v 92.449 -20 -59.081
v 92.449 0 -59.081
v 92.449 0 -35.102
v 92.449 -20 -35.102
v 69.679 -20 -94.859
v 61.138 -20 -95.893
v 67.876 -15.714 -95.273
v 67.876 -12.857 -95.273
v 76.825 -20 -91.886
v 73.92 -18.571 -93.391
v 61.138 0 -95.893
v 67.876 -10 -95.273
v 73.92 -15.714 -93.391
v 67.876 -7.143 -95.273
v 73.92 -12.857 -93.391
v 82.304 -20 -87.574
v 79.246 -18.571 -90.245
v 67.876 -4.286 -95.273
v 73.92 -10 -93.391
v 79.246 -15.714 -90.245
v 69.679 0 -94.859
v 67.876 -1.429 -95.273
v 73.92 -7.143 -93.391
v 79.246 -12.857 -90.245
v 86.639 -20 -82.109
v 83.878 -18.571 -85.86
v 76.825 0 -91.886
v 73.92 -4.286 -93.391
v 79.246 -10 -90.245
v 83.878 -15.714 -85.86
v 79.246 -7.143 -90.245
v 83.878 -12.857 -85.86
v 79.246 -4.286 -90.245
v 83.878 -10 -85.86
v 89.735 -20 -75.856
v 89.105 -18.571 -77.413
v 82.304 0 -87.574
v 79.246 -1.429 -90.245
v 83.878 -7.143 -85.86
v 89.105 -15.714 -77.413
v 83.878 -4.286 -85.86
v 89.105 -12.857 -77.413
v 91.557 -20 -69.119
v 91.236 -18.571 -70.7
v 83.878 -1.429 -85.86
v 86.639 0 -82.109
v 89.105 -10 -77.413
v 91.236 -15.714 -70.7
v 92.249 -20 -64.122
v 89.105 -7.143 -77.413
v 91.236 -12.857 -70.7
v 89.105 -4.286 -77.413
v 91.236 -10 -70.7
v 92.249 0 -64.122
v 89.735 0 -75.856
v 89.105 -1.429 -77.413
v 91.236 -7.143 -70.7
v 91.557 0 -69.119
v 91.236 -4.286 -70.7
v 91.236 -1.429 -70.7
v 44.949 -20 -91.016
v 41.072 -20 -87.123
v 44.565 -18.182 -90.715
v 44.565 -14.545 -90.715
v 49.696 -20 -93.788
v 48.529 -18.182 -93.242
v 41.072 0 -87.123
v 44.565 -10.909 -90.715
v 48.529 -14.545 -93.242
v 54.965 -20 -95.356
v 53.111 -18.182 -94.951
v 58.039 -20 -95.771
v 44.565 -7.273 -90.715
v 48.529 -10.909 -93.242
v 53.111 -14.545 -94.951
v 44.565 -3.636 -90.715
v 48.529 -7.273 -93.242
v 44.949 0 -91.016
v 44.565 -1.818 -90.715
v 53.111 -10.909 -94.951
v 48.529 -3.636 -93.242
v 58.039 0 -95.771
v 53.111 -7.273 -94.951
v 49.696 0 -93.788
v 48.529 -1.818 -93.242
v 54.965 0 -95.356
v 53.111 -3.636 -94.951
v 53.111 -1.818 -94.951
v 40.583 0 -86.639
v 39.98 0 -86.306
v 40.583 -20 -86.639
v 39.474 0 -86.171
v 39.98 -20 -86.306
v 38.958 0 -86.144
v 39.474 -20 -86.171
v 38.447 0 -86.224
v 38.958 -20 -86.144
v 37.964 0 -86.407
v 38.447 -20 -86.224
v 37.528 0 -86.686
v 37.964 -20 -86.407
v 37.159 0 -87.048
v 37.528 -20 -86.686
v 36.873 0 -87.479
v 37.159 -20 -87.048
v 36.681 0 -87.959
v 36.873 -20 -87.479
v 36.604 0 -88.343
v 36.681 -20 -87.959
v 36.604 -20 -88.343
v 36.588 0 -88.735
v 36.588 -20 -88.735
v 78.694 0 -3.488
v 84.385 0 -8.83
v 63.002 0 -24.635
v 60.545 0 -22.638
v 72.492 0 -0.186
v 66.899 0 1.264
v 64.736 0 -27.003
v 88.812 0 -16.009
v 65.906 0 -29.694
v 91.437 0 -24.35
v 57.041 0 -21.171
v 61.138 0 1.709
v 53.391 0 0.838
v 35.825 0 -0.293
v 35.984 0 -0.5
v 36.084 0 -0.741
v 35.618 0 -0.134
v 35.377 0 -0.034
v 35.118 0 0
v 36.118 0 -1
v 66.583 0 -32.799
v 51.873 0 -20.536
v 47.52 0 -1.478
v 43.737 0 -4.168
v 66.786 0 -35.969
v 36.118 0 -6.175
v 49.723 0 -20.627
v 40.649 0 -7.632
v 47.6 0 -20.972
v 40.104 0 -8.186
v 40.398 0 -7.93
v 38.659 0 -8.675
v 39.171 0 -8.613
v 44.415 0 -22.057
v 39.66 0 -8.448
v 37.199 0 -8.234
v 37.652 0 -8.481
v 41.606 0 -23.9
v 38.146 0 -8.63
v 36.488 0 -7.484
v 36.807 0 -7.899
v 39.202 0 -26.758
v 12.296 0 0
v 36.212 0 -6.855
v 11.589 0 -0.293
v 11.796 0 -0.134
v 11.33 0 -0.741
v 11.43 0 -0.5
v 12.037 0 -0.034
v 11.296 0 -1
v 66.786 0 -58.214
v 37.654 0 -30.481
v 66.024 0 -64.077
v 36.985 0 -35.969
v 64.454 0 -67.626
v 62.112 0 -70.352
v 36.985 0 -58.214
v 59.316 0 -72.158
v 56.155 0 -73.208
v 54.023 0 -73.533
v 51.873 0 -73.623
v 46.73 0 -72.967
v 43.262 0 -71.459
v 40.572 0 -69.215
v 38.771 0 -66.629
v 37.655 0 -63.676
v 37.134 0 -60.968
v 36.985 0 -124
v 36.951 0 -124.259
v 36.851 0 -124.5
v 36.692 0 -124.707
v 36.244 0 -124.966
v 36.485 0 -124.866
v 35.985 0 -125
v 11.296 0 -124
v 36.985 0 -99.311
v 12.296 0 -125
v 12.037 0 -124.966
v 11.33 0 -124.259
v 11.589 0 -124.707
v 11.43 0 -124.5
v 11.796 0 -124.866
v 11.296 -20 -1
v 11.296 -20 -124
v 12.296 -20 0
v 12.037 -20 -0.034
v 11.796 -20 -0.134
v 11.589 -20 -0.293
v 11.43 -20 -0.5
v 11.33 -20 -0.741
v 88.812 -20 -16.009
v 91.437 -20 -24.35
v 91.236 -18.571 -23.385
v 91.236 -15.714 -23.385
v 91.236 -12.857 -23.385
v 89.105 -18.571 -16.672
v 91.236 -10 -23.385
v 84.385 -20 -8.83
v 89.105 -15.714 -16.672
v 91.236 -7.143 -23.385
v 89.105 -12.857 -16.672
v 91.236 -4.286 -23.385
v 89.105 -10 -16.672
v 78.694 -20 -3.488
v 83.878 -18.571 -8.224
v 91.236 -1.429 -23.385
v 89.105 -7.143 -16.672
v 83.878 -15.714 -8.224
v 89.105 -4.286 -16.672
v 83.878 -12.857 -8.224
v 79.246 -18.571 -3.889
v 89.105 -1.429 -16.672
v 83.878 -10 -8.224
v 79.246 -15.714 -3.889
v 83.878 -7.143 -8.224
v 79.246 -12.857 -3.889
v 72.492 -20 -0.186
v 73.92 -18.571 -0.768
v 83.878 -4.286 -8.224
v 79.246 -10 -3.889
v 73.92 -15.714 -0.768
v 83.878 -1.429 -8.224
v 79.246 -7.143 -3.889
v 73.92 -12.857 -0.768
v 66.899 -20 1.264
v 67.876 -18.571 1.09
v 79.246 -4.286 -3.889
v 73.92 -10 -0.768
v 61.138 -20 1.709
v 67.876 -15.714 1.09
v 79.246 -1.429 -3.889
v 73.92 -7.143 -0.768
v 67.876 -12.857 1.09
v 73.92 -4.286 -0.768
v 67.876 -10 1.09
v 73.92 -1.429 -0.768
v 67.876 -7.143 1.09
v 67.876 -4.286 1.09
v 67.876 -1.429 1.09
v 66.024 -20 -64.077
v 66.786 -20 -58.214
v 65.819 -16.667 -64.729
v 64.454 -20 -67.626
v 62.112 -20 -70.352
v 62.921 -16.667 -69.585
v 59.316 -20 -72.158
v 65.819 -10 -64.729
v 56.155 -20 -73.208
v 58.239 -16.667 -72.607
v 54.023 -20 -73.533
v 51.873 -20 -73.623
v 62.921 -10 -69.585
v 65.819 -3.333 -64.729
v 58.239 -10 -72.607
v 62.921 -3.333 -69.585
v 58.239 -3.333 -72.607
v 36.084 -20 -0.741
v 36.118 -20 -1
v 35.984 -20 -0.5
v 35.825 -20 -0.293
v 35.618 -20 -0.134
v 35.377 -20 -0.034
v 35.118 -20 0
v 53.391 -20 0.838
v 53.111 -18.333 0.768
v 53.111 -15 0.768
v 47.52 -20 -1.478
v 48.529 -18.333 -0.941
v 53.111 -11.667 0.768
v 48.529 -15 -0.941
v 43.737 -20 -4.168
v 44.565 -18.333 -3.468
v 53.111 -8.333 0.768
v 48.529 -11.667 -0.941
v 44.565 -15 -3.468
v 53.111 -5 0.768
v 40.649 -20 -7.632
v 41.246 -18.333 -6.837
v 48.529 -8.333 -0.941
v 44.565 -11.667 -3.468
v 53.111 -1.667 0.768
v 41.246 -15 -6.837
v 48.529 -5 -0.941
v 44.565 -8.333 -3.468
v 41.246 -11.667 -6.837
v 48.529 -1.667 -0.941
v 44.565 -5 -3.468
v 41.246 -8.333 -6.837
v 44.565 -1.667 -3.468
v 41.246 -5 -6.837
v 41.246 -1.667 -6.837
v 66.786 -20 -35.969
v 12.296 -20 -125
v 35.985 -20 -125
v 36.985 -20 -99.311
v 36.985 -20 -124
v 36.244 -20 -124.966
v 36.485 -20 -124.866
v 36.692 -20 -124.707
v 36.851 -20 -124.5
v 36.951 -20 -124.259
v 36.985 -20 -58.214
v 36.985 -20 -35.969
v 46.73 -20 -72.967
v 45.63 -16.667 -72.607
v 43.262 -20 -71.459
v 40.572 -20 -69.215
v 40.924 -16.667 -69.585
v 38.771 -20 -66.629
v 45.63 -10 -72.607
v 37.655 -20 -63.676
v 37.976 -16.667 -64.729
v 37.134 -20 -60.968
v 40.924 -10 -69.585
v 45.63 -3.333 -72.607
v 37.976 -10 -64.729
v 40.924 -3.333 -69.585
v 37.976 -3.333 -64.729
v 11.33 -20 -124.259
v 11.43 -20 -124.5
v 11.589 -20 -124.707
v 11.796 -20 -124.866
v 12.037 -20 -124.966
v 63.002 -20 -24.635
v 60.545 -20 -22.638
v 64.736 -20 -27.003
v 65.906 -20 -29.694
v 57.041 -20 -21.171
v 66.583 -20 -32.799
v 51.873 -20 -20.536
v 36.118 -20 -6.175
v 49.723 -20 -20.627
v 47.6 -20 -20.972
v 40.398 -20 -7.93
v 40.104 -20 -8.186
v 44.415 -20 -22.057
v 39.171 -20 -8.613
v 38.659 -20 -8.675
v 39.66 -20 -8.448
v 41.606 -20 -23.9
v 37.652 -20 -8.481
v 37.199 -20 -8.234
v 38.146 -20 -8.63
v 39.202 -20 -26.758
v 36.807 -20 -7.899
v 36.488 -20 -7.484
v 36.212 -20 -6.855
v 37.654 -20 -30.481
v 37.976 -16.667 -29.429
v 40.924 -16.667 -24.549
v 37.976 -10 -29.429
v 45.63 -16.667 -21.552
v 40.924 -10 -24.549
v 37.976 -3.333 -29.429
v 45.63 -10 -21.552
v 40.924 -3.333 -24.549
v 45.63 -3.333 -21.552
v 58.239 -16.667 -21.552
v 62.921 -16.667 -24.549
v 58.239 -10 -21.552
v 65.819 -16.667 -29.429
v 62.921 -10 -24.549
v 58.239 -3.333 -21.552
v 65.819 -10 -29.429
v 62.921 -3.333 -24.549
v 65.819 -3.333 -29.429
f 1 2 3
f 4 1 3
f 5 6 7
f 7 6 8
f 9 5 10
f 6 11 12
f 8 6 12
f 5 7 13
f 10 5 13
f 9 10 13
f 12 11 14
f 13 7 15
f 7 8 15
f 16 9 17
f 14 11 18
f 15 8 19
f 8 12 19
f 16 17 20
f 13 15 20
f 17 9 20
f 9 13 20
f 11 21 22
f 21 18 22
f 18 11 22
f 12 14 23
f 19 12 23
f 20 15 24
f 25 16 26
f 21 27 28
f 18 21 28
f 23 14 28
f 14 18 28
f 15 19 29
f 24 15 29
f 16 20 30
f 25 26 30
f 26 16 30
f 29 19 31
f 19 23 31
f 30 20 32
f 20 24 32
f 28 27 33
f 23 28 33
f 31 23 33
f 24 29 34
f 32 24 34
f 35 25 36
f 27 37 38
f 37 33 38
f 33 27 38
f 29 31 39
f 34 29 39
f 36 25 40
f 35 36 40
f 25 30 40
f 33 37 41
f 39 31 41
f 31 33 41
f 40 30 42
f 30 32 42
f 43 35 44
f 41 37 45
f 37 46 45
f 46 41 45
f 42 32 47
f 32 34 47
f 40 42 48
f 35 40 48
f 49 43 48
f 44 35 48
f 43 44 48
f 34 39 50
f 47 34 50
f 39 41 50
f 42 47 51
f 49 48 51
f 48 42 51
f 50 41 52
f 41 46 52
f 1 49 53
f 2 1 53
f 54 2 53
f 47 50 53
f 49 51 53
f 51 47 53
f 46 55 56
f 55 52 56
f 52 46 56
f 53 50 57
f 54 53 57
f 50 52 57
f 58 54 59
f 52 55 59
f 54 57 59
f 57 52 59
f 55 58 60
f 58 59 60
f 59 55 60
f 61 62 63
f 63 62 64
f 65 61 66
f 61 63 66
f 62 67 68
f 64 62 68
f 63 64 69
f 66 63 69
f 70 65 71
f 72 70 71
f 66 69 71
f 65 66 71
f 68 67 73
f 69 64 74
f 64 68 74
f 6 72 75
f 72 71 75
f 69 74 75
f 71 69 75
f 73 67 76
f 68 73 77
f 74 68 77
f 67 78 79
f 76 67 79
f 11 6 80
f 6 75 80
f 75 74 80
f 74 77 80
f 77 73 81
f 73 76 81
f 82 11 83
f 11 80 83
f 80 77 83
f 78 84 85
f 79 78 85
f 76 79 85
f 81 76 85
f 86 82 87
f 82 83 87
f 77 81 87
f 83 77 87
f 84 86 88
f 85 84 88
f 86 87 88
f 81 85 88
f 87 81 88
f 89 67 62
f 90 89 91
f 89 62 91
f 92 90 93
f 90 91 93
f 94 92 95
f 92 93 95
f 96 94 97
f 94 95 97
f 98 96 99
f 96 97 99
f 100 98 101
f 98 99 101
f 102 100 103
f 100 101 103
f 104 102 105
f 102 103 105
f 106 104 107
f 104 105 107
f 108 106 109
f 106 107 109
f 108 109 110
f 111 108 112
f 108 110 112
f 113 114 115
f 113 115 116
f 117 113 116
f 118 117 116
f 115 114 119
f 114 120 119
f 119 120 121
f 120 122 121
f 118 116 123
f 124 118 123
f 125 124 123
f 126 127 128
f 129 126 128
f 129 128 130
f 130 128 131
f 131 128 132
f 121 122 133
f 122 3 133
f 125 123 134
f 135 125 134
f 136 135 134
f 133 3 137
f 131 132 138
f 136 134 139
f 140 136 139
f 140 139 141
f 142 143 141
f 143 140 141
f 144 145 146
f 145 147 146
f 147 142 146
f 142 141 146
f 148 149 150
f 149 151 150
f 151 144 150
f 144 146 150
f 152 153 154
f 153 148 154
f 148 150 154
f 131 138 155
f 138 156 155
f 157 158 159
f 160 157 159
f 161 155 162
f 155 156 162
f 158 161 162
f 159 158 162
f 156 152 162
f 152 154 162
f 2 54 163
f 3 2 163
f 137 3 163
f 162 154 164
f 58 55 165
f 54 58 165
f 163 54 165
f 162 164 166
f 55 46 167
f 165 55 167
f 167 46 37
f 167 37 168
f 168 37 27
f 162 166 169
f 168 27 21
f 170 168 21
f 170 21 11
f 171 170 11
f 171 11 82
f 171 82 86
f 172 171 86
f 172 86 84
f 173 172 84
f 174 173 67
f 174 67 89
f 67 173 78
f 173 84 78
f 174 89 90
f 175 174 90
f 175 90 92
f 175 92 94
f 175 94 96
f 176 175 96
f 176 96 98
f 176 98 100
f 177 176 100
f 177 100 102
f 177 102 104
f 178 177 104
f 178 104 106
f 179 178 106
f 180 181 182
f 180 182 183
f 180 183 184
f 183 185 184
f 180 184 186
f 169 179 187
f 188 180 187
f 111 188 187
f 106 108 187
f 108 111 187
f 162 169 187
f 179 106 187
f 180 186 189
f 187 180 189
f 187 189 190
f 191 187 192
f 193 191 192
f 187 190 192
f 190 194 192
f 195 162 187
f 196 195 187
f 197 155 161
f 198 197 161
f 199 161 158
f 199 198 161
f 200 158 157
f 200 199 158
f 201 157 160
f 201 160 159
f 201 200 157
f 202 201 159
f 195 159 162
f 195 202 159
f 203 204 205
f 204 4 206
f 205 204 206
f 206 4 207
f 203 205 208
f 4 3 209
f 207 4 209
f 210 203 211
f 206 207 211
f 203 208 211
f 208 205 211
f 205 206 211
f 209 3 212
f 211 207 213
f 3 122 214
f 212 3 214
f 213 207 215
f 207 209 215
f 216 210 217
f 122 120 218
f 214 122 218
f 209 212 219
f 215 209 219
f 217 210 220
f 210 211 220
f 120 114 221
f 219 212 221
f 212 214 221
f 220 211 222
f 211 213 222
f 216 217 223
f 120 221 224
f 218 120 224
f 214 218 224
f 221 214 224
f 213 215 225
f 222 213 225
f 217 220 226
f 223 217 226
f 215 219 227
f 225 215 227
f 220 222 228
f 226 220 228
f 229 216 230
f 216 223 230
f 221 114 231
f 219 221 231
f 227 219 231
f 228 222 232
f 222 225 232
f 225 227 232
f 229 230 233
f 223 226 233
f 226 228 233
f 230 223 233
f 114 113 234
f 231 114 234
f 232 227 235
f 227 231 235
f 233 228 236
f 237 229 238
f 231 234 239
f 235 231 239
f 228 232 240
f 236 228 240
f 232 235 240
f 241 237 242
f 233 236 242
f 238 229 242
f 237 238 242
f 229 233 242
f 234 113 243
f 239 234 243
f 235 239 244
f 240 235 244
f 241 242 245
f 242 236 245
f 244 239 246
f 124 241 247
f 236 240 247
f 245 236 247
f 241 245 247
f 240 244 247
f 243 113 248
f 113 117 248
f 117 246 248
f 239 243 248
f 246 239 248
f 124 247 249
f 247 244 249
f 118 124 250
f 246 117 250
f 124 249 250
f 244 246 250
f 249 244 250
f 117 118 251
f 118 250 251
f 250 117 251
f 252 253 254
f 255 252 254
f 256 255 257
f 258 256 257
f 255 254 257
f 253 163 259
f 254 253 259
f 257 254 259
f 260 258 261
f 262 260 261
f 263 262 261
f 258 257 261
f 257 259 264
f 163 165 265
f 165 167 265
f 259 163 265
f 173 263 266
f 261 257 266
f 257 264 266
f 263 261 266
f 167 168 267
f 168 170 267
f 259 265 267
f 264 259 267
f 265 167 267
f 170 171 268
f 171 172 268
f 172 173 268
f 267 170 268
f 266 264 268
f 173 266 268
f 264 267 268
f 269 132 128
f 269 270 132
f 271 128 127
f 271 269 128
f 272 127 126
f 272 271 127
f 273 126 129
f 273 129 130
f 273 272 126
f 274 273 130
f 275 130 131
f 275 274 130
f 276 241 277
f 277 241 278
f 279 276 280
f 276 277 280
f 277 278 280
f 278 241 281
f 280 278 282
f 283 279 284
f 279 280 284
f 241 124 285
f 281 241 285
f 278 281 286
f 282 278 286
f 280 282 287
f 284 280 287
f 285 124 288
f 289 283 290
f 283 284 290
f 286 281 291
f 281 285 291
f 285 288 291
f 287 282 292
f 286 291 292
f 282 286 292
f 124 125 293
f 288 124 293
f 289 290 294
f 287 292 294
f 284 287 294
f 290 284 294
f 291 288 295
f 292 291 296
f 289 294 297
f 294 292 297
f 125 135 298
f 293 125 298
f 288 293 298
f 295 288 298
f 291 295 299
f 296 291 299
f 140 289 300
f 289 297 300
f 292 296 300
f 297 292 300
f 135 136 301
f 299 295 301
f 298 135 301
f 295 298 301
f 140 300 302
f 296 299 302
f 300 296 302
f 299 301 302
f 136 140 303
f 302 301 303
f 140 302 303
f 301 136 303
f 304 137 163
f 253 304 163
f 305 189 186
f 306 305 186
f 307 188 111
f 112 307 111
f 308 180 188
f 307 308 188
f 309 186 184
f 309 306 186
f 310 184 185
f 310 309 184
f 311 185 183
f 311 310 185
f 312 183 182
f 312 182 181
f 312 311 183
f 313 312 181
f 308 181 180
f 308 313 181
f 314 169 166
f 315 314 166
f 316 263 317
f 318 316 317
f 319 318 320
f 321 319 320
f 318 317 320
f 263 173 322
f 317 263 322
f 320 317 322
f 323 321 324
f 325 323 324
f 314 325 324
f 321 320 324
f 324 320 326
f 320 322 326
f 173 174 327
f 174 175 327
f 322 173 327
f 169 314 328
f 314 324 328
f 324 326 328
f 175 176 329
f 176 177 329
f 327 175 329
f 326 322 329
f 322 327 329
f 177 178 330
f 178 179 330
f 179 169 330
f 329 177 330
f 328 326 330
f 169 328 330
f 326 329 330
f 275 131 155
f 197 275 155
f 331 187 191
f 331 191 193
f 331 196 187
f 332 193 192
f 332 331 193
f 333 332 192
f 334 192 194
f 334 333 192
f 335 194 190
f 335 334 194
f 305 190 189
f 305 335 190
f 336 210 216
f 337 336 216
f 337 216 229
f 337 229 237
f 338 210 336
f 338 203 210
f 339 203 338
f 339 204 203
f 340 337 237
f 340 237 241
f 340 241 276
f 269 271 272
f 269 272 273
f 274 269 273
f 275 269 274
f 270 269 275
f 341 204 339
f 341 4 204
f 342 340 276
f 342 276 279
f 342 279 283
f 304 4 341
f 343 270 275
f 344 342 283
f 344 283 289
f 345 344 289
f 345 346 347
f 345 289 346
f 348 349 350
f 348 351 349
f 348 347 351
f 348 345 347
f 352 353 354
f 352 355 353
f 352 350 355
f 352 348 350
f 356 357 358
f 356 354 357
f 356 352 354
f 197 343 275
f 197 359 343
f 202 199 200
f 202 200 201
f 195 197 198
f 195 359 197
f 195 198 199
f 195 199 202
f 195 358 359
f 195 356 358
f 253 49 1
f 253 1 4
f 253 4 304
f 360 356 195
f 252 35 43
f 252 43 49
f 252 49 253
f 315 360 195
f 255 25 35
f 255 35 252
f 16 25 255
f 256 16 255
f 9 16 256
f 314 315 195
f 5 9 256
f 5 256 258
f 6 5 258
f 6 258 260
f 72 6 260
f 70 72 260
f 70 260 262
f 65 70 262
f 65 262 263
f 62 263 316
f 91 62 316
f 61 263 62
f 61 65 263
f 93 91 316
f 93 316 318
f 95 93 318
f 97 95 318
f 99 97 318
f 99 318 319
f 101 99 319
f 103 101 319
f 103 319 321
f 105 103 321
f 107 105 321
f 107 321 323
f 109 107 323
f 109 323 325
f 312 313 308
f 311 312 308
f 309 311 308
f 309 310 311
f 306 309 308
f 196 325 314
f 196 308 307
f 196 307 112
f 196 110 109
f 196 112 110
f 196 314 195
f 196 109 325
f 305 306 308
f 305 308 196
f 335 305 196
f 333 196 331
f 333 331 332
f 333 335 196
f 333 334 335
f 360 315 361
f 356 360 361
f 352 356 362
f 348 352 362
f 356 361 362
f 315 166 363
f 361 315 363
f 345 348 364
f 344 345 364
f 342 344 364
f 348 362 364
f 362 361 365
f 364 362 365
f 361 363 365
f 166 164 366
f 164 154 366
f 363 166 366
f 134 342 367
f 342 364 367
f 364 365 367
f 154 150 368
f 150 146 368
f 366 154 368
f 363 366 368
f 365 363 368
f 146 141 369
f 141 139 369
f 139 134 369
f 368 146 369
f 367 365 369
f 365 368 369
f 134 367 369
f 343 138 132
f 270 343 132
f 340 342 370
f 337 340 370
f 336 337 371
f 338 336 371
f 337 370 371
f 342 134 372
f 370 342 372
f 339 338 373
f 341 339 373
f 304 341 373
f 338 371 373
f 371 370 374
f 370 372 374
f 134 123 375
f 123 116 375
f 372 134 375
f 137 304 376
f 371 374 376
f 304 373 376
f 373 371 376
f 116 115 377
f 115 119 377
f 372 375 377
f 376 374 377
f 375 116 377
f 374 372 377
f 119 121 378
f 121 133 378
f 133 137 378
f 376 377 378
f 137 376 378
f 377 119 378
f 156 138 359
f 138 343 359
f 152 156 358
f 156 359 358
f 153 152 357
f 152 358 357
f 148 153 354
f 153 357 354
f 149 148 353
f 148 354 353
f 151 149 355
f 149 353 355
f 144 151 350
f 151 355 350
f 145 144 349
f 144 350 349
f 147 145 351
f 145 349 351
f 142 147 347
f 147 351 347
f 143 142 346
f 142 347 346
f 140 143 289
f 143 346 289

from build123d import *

# Parameters (mm, degrees)
BOSS_EXTRUDE1_DEPTH = 20
FILLET1_R           = 2.5
FILLET2_R           = 1


with BuildPart() as part:
    # Sketch1 → Boss-Extrude1 (new body)
    with BuildSketch(Plane(origin=(0, 0, 0), x_dir=(1, 0, 0), z_dir=(0, 1, 0))):
        with BuildLine():
            Line((36.117717004, 19.916765755), (36.117717004, 0))
            Line((36.117717004, 0), (11.2960761, 0))
            Line((11.2960761, 0), (11.2960761, 125))
            Line((11.2960761, 125), (36.984740388, 125))
            Line((36.984740388, 125), (36.984740388, 99.311335711))
            Line((36.984740388, 99.311335711), (36.117717004, 76.198969481))
            add(Edge.make_bspline(
                [(36.117717004, 76.198969481), (37.079035526, 78.513840699), (37.821716785, 81.825002834), (39.841285118, 85.425058127), (41.21525815, 87.372030125), (42.770642161, 89.163856041), (44.531204538, 90.74523712), (46.455711817, 92.116095649), (48.524028366, 93.283848821), (50.743017021, 94.262315505), (53.129690053, 95.000321934), (56.595091524, 95.697992737), (59.296350256, 95.909848431), (61.137534681, 95.892786365)],
                knots=[0, 0, 0, 0, 0.21768002, 0.286847597, 0.354813327, 0.422943008, 0.491013117, 0.558398108, 0.626322787, 0.695519685, 0.767143763, 0.841303709, 1, 1, 1, 1], degree=3))
            add(Edge.make_bspline(
                [(61.137534681, 95.892786365), (63.395086057, 95.903685841), (66.735821106, 95.621334637), (70.981289729, 94.544167423), (73.935977914, 93.451744493), (76.70594677, 92.030063316), (79.28991441, 90.280281683), (81.71457152, 88.236417621), (83.926657745, 85.882399021), (85.942182726, 83.286794391), (87.670170765, 80.442277233), (89.170620742, 77.406405656), (90.390921152, 74.14710145), (91.289056083, 70.663202505), (92.199939451, 65.644798855), (92.480055787, 61.741506128), (92.449464923, 59.081450654)],
                knots=[0, 0, 0, 0, 0.12448834, 0.183662525, 0.240987058, 0.297785083, 0.354848785, 0.412664579, 0.472231373, 0.532594602, 0.593487538, 0.655372754, 0.719036994, 0.784951013, 0.85343042, 1, 1, 1, 1], degree=3))
            Line((92.449464923, 59.081450654), (92.449464923, 35.102061038))
            add(Edge.make_bspline(
                [(92.449464923, 35.102061038), (92.481706946, 32.417206566), (92.200218527, 28.481210749), (91.291825145, 23.429095843), (90.392084489, 19.936614782), (89.162904767, 16.673762861), (87.685043138, 13.625497661), (85.932163927, 10.795769529), (83.93534446, 8.202568905), (81.712640064, 5.873123122), (79.290226272, 3.851331714), (76.698739641, 2.131042563), (73.936325888, 0.70776156), (70.984961829, -0.392480025), (66.728426656, -1.4160417), (63.397954668, -1.731864559), (61.137534681, -1.709274673)],
                knots=[0, 0, 0, 0, 0.147807026, 0.216676018, 0.282534324, 0.346144753, 0.408386101, 0.468840468, 0.529152677, 0.588339784, 0.645814146, 0.702576919, 0.759326937, 0.816603017, 0.875616881, 1, 1, 1, 1], degree=3))
            add(Edge.make_bspline(
                [(61.137534681, -1.709274673), (59.296350246, -1.726336751), (56.595091542, -1.514481022), (53.129690028, -0.816810273), (50.743017111, -0.078803702), (48.524028045, 0.899662475), (46.455712988, 2.067417488), (44.531200185, 3.438269202), (42.7706586, 5.019675936), (41.215196821, 6.811405891), (39.841515083, 8.758737328), (38.654148229, 10.871953586), (37.24125462, 14.565590682), (36.509346228, 17.63130127), (36.117717004, 19.916765755)],
                knots=[0, 0, 0, 0, 0.150649959, 0.221049795, 0.289042338, 0.354730766, 0.41921148, 0.483179869, 0.547798639, 0.612473961, 0.676993644, 0.742654238, 0.810316636, 1, 1, 1, 1], degree=3))
        make_face()
        with BuildLine():
            Line((66.785572731, 35.969084423), (66.785572731, 58.214427269))
            add(Edge.make_bspline(
                [(66.785572731, 58.214427269), (66.771829802, 60.406770749), (66.417836342, 63.625724633), (64.723817468, 67.39558891), (63.000354868, 69.655005362), (60.827701936, 71.453642984), (57.173659281, 73.229809674), (54.023085733, 73.637658685), (51.872770511, 73.622671423)],
                knots=[0, 0, 0, 0, 0.271016724, 0.390594505, 0.504399399, 0.61771336, 0.734495657, 1, 1, 1, 1], degree=3))
            add(Edge.make_bspline(
                [(51.872770511, 73.622671423), (49.759720525, 73.644159543), (46.659201079, 73.209984567), (43.036444514, 71.44905498), (40.849183836, 69.648312437), (39.063540587, 67.412914524), (37.394409246, 63.61564329), (36.967690872, 60.41840948), (36.984740388, 58.214427269)],
                knots=[0, 0, 0, 0, 0.261213344, 0.378316389, 0.492729113, 0.608095085, 0.728001293, 1, 1, 1, 1], degree=3))
            Line((36.984740388, 58.214427269), (36.984740388, 35.969084423))
            add(Edge.make_bspline(
                [(36.984740388, 35.969084423), (36.967648998, 33.758379722), (37.387401392, 30.548144965), (39.070893069, 26.743120106), (40.841102205, 24.488680021), (43.031159697, 22.68091473), (46.671799289, 20.967376381), (49.754651115, 20.503707396), (51.872770511, 20.536068173)],
                knots=[0, 0, 0, 0, 0.272641397, 0.39238352, 0.508393071, 0.622649228, 0.739144111, 1, 1, 1, 1], degree=3))
            add(Edge.make_bspline(
                [(51.872770511, 20.536068173), (54.028327267, 20.509831436), (57.160874782, 20.947979289), (60.832954812, 22.676374312), (63.008458872, 24.482146365), (64.716399441, 26.760301899), (66.424893748, 30.538107854), (66.771576456, 33.77007391), (66.785572731, 35.969084423)],
                knots=[0, 0, 0, 0, 0.265139708, 0.381314935, 0.494473274, 0.608929805, 0.728343363, 1, 1, 1, 1], degree=3))
        make_face(mode=Mode.SUBTRACT)
    extrude(amount=-BOSS_EXTRUDE1_DEPTH)

    # Fillet1
    fillet1_edges = [part.edges().sort_by_distance(p)[0] for p in [
        (36.117717004, -10, -76.198969481),
        (36.117717004, -10, -19.916765755),
    ]]
    fillet(fillet1_edges, radius=FILLET1_R)

    # Fillet2
    fillet2_edges = [part.edges().sort_by_distance(p)[0] for p in [
        (36.117717004, -10, 0),
        (11.2960761, -10, 0),
        (11.2960761, -10, -125),
        (36.984740388, -10, -125),
    ]]
    fillet(fillet2_edges, radius=FILLET2_R)


solid = part.part
